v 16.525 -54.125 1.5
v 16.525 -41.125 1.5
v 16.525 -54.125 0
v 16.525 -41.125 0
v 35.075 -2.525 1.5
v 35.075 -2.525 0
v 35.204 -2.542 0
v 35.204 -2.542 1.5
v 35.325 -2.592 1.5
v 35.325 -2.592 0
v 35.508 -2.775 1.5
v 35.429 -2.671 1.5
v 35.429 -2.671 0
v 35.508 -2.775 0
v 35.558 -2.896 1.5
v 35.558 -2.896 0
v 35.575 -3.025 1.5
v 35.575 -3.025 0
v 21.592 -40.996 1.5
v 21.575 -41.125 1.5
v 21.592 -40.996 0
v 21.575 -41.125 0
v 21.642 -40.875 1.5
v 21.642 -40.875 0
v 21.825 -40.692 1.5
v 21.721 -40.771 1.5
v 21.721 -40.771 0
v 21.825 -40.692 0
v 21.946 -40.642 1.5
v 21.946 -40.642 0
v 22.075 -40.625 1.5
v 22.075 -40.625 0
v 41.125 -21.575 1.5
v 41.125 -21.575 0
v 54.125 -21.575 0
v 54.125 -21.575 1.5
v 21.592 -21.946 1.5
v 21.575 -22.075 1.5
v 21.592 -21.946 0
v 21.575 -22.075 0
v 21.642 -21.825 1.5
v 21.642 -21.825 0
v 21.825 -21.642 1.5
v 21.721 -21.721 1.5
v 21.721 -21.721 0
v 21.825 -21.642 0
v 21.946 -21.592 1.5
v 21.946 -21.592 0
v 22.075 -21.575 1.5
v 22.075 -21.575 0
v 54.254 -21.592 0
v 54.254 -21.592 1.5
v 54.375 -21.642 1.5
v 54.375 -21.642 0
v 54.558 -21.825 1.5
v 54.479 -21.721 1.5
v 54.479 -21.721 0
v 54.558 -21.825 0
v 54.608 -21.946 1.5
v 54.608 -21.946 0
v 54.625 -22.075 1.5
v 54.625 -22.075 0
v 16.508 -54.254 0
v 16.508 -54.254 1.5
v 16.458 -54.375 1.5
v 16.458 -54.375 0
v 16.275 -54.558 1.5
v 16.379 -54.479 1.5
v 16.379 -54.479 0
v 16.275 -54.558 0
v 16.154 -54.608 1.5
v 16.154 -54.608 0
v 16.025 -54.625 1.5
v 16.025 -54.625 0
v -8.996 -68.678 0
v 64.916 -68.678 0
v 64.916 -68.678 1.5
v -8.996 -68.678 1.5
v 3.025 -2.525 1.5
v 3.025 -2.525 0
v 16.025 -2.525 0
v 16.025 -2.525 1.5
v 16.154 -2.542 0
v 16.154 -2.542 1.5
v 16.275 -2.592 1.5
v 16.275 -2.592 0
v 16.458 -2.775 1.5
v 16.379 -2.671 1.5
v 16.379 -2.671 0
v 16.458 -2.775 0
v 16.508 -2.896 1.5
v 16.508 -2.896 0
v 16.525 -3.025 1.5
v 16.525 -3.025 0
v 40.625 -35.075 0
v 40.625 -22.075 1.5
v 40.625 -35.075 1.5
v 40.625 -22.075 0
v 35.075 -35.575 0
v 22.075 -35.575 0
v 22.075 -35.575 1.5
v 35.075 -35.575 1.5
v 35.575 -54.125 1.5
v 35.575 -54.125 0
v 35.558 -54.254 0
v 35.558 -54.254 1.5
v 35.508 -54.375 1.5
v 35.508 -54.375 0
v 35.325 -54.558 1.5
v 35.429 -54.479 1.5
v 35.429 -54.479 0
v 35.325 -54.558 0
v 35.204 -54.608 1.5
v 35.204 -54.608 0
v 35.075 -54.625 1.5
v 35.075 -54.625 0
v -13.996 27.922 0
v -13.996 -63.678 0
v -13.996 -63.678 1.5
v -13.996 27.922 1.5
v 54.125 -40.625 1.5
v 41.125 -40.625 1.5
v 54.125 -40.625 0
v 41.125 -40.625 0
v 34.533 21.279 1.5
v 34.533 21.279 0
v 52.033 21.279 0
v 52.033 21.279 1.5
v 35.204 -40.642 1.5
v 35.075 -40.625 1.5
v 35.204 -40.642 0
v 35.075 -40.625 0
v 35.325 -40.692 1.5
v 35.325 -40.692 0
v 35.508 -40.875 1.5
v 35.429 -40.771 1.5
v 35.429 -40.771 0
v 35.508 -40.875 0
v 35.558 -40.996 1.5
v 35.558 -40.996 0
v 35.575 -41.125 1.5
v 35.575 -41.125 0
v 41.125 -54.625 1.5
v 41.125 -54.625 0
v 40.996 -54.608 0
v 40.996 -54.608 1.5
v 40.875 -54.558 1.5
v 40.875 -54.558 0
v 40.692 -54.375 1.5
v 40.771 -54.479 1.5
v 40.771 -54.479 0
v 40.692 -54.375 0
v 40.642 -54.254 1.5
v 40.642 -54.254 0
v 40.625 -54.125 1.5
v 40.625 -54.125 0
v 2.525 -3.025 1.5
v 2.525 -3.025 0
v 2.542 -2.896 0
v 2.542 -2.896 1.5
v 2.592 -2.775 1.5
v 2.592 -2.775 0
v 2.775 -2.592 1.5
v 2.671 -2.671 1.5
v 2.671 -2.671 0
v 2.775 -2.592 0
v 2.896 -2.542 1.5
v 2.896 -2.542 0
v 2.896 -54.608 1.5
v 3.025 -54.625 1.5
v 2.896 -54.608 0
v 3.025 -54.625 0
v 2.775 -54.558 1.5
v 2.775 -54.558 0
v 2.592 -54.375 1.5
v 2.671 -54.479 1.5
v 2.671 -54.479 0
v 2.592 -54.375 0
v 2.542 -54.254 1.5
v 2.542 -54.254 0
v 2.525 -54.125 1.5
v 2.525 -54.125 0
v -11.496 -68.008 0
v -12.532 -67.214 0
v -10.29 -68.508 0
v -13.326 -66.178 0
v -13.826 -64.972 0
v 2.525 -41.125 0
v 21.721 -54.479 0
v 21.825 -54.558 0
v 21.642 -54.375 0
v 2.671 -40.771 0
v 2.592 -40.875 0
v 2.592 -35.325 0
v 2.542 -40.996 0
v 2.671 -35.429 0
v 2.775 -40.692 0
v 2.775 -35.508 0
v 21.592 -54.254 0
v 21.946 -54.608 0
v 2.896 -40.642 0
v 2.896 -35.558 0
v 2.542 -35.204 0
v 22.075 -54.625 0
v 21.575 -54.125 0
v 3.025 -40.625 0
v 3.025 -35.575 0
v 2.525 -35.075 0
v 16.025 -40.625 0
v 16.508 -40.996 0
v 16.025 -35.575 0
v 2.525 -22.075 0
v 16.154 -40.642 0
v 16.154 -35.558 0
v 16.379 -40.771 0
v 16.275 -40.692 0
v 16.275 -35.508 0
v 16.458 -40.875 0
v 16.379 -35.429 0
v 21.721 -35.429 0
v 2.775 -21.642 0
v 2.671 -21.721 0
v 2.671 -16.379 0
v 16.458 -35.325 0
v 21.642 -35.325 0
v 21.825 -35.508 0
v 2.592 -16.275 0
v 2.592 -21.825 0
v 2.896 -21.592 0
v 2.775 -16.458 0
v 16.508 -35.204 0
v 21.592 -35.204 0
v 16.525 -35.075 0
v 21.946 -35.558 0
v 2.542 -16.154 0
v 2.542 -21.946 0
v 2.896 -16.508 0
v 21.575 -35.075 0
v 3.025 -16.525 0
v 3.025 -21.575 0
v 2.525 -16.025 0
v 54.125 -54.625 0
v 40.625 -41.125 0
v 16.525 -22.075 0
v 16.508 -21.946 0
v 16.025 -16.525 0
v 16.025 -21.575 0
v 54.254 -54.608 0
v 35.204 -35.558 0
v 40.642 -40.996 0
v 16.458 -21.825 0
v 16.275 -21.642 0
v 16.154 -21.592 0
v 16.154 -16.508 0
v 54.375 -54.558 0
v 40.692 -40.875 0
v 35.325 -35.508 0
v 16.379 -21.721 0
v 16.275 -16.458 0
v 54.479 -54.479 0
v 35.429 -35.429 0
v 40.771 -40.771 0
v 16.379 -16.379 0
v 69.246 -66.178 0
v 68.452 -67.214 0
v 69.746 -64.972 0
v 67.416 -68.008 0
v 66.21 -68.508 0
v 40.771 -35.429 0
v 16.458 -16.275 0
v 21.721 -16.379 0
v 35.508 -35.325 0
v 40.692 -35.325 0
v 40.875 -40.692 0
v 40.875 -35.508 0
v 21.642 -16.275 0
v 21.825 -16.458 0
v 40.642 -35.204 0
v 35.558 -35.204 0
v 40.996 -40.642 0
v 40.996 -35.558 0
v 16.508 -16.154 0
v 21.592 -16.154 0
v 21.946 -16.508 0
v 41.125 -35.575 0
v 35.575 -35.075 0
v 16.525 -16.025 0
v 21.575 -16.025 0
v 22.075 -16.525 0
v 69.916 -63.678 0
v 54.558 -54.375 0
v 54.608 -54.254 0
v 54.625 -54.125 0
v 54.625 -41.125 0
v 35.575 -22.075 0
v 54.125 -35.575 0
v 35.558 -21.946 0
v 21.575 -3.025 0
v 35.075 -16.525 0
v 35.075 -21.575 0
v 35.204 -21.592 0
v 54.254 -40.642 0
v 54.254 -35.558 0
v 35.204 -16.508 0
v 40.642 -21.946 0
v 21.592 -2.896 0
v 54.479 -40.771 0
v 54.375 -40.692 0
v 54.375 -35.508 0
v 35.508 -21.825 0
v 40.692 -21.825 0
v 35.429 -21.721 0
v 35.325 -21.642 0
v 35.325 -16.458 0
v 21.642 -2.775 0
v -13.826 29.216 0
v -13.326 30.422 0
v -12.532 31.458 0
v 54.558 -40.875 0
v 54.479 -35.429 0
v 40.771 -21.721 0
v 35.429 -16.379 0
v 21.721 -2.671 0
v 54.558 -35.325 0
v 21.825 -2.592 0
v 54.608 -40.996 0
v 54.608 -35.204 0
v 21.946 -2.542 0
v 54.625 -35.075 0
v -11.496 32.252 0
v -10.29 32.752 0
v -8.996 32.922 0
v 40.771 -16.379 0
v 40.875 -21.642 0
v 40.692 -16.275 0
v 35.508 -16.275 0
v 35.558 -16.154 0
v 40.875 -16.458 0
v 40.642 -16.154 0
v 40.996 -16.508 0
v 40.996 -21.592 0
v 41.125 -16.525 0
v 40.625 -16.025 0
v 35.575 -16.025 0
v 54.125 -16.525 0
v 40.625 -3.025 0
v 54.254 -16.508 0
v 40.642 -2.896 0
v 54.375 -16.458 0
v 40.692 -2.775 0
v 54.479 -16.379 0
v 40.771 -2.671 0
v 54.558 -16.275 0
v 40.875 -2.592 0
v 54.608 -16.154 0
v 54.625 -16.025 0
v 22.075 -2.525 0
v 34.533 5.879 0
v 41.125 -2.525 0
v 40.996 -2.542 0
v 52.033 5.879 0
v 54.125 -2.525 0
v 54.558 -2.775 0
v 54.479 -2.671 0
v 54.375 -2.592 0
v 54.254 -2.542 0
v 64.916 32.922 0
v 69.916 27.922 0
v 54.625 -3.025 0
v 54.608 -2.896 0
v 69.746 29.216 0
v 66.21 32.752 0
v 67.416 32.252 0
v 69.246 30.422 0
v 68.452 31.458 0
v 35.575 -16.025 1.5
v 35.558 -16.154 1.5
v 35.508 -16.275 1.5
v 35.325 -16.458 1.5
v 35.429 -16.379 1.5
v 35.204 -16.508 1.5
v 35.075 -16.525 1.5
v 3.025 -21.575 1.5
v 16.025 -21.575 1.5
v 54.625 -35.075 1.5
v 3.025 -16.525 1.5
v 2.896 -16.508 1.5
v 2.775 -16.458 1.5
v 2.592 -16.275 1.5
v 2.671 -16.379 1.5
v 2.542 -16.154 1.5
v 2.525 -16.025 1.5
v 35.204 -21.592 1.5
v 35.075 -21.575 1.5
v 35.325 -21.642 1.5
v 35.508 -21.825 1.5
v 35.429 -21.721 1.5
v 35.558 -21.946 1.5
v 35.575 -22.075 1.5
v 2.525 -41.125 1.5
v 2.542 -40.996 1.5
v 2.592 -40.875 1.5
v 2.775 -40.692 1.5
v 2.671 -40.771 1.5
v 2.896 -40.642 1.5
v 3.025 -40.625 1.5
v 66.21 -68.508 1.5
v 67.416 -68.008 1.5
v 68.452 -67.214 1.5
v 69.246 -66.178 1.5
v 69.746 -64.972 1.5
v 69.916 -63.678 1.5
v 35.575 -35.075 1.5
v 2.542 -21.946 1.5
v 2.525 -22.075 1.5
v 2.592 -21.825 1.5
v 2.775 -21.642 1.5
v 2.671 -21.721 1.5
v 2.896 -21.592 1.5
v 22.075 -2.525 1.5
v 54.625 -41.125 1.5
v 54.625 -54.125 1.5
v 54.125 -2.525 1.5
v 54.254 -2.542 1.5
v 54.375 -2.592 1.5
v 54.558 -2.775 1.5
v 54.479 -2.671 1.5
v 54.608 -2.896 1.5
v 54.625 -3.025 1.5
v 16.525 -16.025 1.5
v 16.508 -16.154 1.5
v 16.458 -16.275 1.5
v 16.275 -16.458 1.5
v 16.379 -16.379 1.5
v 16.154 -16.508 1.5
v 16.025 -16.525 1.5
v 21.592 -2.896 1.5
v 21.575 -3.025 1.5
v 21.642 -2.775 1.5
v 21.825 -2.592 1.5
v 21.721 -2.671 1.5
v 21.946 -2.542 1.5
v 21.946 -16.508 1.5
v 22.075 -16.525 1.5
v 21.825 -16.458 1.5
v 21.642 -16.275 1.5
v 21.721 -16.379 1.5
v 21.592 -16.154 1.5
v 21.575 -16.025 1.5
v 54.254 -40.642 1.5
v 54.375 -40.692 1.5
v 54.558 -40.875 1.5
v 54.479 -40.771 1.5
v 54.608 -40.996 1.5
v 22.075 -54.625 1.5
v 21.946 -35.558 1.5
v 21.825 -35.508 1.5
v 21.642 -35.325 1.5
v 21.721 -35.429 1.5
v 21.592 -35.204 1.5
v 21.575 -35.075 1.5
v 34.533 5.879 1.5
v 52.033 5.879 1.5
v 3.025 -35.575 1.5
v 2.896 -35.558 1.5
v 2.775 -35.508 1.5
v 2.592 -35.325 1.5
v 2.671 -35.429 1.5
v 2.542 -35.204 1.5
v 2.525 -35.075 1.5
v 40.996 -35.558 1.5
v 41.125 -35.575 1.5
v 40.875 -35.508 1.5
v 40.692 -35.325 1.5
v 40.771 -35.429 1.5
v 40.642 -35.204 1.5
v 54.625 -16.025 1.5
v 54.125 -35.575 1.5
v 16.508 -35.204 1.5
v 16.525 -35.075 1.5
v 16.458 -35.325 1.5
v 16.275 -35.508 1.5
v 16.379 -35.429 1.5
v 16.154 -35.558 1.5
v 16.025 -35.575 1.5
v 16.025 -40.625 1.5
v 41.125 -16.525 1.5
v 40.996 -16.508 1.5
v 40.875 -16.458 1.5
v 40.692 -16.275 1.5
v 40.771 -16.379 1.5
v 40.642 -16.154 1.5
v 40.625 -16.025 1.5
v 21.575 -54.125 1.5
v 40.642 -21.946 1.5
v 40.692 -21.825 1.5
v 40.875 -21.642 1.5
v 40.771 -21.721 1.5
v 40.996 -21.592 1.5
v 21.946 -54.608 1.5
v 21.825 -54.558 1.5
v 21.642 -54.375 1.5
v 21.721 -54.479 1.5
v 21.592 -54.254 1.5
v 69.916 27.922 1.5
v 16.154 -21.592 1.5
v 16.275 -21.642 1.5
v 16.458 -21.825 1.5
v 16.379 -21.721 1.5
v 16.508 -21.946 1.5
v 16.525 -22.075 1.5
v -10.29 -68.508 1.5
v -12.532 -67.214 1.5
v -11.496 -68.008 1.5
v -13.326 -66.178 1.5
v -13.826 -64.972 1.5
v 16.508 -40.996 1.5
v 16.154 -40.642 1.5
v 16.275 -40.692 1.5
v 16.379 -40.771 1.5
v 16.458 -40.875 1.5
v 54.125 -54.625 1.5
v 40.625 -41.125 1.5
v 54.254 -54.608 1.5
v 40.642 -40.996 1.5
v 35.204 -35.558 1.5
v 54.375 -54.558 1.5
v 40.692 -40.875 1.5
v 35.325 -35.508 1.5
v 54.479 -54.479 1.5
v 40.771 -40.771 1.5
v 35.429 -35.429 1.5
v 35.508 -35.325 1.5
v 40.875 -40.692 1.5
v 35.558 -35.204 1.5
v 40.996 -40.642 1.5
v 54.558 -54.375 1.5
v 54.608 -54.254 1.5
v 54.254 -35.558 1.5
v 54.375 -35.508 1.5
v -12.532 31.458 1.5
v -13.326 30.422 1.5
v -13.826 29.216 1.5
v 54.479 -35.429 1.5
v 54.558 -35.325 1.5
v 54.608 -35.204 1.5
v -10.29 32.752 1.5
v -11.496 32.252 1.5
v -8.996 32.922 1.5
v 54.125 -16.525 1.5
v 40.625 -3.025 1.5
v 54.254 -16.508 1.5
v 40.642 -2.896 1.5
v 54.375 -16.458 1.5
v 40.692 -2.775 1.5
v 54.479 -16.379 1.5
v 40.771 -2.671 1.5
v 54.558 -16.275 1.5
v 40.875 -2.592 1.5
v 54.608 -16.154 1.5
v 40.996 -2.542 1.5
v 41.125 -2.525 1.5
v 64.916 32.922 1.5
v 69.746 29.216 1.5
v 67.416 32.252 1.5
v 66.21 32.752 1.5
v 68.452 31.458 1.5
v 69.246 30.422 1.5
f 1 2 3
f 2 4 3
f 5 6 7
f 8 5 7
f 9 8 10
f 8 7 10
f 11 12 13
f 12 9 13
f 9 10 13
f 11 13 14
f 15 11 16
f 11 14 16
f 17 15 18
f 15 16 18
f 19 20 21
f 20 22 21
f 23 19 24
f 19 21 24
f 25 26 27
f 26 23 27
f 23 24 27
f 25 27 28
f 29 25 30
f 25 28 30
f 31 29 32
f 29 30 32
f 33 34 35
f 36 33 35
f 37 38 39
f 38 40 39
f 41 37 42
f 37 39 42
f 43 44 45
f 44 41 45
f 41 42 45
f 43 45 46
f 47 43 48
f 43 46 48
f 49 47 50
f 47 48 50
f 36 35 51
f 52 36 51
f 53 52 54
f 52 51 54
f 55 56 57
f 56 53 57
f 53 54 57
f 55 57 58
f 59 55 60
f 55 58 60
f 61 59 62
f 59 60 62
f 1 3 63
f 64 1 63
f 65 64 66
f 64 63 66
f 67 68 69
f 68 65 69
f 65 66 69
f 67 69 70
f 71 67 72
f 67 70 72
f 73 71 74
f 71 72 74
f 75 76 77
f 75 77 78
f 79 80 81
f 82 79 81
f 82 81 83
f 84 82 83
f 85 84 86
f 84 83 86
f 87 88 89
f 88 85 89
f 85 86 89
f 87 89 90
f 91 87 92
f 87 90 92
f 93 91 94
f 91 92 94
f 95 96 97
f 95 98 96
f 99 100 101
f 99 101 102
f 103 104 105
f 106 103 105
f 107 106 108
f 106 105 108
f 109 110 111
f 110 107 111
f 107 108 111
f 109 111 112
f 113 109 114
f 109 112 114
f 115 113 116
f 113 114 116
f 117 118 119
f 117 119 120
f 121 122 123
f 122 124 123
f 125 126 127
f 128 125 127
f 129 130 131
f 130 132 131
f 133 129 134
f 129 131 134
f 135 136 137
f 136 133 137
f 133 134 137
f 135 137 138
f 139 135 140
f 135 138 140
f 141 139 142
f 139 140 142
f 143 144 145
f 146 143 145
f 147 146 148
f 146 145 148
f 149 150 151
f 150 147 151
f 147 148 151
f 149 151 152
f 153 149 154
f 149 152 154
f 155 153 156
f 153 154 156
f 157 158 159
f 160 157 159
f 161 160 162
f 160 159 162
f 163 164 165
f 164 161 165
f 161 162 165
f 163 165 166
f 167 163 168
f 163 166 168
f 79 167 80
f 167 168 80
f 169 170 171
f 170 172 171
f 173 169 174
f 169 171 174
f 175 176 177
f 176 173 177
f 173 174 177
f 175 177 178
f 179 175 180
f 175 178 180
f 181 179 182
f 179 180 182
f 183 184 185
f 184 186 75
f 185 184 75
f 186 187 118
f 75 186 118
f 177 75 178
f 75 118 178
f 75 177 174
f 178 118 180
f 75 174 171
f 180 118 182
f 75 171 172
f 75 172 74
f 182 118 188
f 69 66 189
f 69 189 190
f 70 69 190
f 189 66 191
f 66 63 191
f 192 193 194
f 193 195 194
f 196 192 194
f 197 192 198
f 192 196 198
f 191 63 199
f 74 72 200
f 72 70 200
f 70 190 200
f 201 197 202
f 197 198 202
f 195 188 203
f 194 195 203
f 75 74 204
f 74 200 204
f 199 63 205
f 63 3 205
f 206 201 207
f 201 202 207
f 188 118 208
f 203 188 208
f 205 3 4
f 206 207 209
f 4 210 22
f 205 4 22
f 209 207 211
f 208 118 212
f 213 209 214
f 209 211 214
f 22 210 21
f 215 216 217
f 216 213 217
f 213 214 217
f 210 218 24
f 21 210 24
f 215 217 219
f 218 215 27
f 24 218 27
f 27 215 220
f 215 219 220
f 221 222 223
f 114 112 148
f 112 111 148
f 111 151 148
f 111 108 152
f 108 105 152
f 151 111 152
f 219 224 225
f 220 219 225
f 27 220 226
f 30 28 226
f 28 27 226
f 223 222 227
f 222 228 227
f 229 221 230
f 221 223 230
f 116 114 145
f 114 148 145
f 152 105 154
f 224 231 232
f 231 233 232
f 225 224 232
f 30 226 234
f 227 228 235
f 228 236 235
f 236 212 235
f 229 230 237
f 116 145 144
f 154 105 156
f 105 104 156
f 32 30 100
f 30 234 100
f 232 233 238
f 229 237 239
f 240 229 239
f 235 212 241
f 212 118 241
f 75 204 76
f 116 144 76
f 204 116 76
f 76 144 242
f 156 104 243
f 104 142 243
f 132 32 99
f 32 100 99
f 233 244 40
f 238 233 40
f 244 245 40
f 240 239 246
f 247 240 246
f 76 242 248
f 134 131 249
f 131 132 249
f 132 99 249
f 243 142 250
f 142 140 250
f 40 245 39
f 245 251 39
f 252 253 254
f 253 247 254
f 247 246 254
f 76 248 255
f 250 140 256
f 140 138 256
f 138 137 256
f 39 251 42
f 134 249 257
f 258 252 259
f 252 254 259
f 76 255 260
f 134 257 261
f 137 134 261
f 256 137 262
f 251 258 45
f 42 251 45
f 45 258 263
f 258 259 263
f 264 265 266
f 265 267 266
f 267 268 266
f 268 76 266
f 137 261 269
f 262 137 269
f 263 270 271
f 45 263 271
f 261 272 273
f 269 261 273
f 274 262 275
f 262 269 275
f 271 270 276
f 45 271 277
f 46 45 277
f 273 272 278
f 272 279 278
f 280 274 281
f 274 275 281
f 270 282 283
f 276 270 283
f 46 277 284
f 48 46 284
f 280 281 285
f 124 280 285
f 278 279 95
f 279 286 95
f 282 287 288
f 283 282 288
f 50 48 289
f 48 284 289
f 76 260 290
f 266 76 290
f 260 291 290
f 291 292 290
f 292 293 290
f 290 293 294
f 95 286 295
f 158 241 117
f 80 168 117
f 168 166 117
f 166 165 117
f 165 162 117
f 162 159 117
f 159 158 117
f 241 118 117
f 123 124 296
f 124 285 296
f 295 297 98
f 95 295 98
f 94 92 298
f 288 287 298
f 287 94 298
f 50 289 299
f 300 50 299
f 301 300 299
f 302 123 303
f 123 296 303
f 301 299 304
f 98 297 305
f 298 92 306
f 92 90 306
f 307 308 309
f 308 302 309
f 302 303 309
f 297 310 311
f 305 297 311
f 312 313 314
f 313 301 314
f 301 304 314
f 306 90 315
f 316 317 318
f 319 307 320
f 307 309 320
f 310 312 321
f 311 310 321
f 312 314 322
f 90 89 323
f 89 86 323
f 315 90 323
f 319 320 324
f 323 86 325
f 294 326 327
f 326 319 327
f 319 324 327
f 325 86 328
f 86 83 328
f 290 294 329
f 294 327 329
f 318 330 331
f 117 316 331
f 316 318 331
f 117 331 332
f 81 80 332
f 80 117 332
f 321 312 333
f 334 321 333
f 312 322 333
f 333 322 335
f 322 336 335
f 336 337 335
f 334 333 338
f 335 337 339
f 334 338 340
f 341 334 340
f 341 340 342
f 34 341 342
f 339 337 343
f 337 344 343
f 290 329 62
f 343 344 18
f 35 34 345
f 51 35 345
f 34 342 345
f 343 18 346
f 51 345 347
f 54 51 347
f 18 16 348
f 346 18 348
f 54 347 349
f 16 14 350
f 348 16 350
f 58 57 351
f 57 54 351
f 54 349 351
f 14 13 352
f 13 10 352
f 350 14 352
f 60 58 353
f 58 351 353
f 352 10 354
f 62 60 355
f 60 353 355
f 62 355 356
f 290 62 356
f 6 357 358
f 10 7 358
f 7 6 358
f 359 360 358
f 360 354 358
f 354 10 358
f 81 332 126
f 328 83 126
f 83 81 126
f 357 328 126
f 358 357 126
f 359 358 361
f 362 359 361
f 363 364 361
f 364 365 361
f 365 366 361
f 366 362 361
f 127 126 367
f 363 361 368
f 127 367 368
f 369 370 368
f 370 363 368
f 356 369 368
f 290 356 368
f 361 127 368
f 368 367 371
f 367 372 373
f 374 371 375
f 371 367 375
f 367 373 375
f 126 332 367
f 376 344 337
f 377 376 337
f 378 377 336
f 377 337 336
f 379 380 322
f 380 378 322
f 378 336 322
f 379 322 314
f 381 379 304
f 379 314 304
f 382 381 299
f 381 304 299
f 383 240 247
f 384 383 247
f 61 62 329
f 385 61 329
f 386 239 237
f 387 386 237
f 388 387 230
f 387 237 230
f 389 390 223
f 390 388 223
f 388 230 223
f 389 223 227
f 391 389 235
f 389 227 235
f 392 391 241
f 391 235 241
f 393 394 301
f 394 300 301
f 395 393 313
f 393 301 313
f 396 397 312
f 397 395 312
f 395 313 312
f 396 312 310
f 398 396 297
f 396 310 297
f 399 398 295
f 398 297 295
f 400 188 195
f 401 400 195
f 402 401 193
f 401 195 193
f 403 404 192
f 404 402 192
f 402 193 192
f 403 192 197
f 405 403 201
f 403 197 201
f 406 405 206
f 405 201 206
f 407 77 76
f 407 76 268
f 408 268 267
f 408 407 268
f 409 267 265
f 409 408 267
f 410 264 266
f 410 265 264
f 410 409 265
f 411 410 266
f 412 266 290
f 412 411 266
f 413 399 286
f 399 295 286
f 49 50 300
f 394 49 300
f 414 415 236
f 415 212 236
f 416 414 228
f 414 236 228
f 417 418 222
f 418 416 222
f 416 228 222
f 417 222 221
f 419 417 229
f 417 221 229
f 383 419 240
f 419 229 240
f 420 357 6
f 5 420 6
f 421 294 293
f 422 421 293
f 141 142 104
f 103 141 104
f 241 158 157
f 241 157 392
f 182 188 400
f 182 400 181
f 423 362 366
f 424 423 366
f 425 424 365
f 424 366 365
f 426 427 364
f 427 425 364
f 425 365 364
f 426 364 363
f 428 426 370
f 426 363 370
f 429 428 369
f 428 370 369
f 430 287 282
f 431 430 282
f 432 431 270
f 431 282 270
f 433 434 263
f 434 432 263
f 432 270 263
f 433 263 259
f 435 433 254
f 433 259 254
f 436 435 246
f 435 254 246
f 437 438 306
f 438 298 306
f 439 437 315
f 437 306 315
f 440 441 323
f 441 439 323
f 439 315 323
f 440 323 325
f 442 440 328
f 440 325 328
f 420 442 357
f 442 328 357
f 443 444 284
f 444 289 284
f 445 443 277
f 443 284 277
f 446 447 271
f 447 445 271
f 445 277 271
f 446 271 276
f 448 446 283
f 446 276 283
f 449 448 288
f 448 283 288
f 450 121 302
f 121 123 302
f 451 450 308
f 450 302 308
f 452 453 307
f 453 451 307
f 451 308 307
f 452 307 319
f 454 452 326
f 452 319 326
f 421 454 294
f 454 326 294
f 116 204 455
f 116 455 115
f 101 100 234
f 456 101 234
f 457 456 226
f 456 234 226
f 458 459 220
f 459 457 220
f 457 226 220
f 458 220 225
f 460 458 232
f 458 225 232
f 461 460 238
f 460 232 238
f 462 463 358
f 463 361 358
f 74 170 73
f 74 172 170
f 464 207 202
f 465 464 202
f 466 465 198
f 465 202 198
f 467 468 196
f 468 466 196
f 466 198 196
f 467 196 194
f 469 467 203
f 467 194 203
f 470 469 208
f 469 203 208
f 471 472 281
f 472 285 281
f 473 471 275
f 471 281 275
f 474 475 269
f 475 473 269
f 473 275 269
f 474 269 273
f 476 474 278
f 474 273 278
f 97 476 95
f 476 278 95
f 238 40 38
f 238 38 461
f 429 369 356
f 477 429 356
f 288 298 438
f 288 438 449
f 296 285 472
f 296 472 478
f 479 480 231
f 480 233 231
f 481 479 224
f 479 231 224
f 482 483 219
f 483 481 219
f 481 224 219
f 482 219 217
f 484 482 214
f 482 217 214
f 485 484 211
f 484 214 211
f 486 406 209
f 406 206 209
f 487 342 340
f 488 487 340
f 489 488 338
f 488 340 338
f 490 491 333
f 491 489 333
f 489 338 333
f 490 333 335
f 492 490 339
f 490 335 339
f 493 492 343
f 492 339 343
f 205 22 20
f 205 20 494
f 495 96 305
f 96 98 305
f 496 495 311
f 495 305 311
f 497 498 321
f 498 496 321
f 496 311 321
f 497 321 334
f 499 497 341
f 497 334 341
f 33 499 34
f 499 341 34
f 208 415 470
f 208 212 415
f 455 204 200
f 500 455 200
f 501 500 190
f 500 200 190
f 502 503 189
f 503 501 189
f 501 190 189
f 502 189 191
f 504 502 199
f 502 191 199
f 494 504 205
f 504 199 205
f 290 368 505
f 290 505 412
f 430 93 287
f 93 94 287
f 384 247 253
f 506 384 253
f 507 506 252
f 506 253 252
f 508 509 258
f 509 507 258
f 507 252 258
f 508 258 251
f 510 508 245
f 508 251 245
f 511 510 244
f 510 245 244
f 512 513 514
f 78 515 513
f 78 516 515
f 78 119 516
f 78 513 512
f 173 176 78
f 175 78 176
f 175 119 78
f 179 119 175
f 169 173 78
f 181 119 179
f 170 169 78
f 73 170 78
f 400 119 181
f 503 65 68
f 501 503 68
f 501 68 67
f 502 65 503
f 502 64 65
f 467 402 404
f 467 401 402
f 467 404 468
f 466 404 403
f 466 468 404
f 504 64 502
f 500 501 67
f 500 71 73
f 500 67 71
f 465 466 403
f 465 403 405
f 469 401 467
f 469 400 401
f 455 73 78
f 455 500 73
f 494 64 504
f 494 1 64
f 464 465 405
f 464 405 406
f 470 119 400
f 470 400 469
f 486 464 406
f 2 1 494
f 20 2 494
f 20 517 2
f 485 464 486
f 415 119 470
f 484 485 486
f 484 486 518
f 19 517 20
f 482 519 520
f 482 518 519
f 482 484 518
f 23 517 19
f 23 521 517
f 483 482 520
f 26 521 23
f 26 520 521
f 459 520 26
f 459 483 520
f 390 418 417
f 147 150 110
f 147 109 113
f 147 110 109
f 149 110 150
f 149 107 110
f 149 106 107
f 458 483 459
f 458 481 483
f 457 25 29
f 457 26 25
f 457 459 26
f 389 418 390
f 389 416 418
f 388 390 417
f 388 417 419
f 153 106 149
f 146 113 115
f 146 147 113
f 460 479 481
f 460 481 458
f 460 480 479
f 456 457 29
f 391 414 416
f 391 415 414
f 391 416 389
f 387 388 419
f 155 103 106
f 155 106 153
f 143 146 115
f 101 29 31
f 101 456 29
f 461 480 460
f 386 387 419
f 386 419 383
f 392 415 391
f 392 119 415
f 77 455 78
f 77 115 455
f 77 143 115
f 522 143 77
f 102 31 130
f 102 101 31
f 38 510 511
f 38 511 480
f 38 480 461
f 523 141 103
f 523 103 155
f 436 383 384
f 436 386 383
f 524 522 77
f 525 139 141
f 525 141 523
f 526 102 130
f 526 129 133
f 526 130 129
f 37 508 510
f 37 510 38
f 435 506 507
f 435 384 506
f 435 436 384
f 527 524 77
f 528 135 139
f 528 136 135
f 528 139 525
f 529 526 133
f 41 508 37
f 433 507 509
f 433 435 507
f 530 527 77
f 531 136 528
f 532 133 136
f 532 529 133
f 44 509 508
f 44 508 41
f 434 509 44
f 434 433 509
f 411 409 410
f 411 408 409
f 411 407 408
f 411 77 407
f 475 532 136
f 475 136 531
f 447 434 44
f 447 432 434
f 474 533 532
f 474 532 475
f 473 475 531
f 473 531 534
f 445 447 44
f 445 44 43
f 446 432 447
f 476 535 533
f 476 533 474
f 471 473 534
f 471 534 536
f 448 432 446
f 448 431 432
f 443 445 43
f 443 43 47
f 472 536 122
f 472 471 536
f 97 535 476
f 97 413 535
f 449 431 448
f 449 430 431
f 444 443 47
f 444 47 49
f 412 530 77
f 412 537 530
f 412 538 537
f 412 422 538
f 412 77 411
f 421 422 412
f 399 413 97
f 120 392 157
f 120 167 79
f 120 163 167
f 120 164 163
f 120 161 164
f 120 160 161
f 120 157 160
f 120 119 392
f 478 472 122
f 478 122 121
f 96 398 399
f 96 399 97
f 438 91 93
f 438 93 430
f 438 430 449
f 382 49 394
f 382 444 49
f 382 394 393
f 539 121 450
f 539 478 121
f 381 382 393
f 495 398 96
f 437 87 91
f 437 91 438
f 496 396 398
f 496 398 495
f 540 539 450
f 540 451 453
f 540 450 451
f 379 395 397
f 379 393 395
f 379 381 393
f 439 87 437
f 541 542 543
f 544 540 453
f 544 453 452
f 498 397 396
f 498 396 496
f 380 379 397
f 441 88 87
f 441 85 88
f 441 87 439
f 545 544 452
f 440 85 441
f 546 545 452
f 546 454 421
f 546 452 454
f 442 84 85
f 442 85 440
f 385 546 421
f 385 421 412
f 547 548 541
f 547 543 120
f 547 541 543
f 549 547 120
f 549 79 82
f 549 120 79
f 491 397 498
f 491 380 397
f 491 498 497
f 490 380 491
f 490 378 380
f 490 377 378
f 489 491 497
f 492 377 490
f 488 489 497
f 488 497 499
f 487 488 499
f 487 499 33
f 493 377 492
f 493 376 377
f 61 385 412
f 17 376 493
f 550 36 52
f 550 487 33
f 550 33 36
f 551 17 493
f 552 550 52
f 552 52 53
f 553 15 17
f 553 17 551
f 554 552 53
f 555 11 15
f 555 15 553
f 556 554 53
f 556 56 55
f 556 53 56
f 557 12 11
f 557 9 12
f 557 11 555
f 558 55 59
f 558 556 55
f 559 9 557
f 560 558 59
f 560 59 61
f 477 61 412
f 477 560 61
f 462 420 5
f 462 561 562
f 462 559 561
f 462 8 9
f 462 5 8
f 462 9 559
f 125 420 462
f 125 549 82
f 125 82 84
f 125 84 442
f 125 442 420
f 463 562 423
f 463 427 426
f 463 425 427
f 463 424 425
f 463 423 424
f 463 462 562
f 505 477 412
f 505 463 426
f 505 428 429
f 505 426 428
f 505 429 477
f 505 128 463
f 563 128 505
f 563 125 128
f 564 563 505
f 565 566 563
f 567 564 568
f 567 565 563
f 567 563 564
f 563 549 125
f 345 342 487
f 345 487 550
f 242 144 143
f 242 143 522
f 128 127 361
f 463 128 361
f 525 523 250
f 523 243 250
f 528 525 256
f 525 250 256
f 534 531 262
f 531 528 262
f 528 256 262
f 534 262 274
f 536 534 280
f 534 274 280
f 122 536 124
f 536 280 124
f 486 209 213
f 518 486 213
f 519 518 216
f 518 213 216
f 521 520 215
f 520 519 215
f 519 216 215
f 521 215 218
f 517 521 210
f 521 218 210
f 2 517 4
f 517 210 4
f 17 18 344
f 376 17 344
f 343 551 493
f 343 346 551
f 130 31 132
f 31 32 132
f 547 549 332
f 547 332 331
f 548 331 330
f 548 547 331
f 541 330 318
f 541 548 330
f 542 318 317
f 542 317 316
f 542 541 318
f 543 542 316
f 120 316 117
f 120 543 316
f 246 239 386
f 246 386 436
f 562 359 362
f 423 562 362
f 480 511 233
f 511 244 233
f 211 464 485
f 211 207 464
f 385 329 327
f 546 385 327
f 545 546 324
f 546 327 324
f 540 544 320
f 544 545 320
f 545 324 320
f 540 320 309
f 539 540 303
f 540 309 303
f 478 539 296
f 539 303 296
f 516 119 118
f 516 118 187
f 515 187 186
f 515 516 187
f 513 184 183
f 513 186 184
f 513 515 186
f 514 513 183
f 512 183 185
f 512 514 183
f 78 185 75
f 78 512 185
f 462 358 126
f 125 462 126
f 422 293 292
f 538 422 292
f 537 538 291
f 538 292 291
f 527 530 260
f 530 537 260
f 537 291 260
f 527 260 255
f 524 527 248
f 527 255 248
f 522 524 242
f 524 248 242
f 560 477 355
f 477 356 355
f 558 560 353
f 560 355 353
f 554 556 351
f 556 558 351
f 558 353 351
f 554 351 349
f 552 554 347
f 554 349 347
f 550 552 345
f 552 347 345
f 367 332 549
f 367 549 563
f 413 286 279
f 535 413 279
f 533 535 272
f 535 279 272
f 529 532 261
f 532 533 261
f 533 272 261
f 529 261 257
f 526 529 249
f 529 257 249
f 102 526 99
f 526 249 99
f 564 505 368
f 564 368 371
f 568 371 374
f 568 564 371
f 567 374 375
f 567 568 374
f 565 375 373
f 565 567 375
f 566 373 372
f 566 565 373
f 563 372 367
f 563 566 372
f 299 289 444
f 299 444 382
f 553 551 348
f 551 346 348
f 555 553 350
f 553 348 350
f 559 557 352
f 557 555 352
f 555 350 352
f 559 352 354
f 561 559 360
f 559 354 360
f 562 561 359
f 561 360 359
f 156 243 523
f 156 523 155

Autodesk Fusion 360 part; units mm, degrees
sketch "Szkic1" plane through (0, 0, 0) normal (0, 0, 1) x (1, 0, 0)
  line L0 (-13.996, 32.922) -> (69.916, 32.922)
  line L1 (69.916, 32.922) -> (69.916, -68.678)
  line L2 (69.916, -68.678) -> (-13.996, -68.678)
  line L3 (-13.996, -68.678) -> (-13.996, 32.922)
  line L4 (3.025, -2.525) -> (16.025, -2.525)
  line L5 (3.025, -16.525) -> (16.025, -16.525)
  line L6 (2.525, -3.025) -> (2.525, -16.025)
  line L7 (16.525, -3.025) -> (16.525, -16.025)
  arc A0 (3.025, -2.525) -> (2.525, -3.025) centre (3.025, -3.025) ccw
  arc A1 (16.525, -3.025) -> (16.025, -2.525) centre (16.025, -3.025) ccw
  arc A2 (2.525, -16.025) -> (3.025, -16.525) centre (3.025, -16.025) ccw
  arc A3 (16.025, -16.525) -> (16.525, -16.025) centre (16.025, -16.025) ccw
  line L8 (22.075, -2.525) -> (35.075, -2.525)
  line L9 (22.075, -16.525) -> (35.075, -16.525)
  line L10 (21.575, -3.025) -> (21.575, -16.025)
  line L11 (35.575, -3.025) -> (35.575, -16.025)
  arc A4 (22.075, -2.525) -> (21.575, -3.025) centre (22.075, -3.025) ccw
  arc A5 (35.575, -3.025) -> (35.075, -2.525) centre (35.075, -3.025) ccw
  arc A6 (21.575, -16.025) -> (22.075, -16.525) centre (22.075, -16.025) ccw
  arc A7 (35.075, -16.525) -> (35.575, -16.025) centre (35.075, -16.025) ccw
  line L12 (41.125, -2.525) -> (54.125, -2.525)
  line L13 (41.125, -16.525) -> (54.125, -16.525)
  line L14 (40.625, -3.025) -> (40.625, -16.025)
  line L15 (54.625, -3.025) -> (54.625, -16.025)
  arc A8 (41.125, -2.525) -> (40.625, -3.025) centre (41.125, -3.025) ccw
  arc A9 (54.625, -3.025) -> (54.125, -2.525) centre (54.125, -3.025) ccw
  arc A10 (40.625, -16.025) -> (41.125, -16.525) centre (41.125, -16.025) ccw
  arc A11 (54.125, -16.525) -> (54.625, -16.025) centre (54.125, -16.025) ccw
  line L16 (3.025, -21.575) -> (16.025, -21.575)
  line L17 (3.025, -35.575) -> (16.025, -35.575)
  line L18 (2.525, -22.075) -> (2.525, -35.075)
  line L19 (16.525, -22.075) -> (16.525, -35.075)
  arc A12 (3.025, -21.575) -> (2.525, -22.075) centre (3.025, -22.075) ccw
  arc A13 (16.525, -22.075) -> (16.025, -21.575) centre (16.025, -22.075) ccw
  arc A14 (2.525, -35.075) -> (3.025, -35.575) centre (3.025, -35.075) ccw
  arc A15 (16.025, -35.575) -> (16.525, -35.075) centre (16.025, -35.075) ccw
  line L20 (22.075, -21.575) -> (35.075, -21.575)
  line L21 (22.075, -35.575) -> (35.075, -35.575)
  line L22 (21.575, -22.075) -> (21.575, -35.075)
  line L23 (35.575, -22.075) -> (35.575, -35.075)
  arc A16 (22.075, -21.575) -> (21.575, -22.075) centre (22.075, -22.075) ccw
  arc A17 (35.575, -22.075) -> (35.075, -21.575) centre (35.075, -22.075) ccw
  arc A18 (21.575, -35.075) -> (22.075, -35.575) centre (22.075, -35.075) ccw
  arc A19 (35.075, -35.575) -> (35.575, -35.075) centre (35.075, -35.075) ccw
  line L24 (41.125, -21.575) -> (54.125, -21.575)
  line L25 (41.125, -35.575) -> (54.125, -35.575)
  line L26 (40.625, -22.075) -> (40.625, -35.075)
  line L27 (54.625, -22.075) -> (54.625, -35.075)
  arc A20 (41.125, -21.575) -> (40.625, -22.075) centre (41.125, -22.075) ccw
  arc A21 (54.625, -22.075) -> (54.125, -21.575) centre (54.125, -22.075) ccw
  arc A22 (40.625, -35.075) -> (41.125, -35.575) centre (41.125, -35.075) ccw
  arc A23 (54.125, -35.575) -> (54.625, -35.075) centre (54.125, -35.075) ccw
  line L28 (3.025, -40.625) -> (16.025, -40.625)
  line L29 (3.025, -54.625) -> (16.025, -54.625)
  line L30 (2.525, -41.125) -> (2.525, -54.125)
  line L31 (16.525, -41.125) -> (16.525, -54.125)
  arc A24 (3.025, -40.625) -> (2.525, -41.125) centre (3.025, -41.125) ccw
  arc A25 (16.525, -41.125) -> (16.025, -40.625) centre (16.025, -41.125) ccw
  arc A26 (2.525, -54.125) -> (3.025, -54.625) centre (3.025, -54.125) ccw
  arc A27 (16.025, -54.625) -> (16.525, -54.125) centre (16.025, -54.125) ccw
  line L32 (22.075, -40.625) -> (35.075, -40.625)
  line L33 (22.075, -54.625) -> (35.075, -54.625)
  line L34 (21.575, -41.125) -> (21.575, -54.125)
  line L35 (35.575, -41.125) -> (35.575, -54.125)
  arc A28 (22.075, -40.625) -> (21.575, -41.125) centre (22.075, -41.125) ccw
  arc A29 (35.575, -41.125) -> (35.075, -40.625) centre (35.075, -41.125) ccw
  arc A30 (21.575, -54.125) -> (22.075, -54.625) centre (22.075, -54.125) ccw
  arc A31 (35.075, -54.625) -> (35.575, -54.125) centre (35.075, -54.125) ccw
  line L36 (41.125, -40.625) -> (54.125, -40.625)
  line L37 (41.125, -54.625) -> (54.125, -54.625)
  line L38 (40.625, -41.125) -> (40.625, -54.125)
  line L39 (54.625, -41.125) -> (54.625, -54.125)
  arc A32 (41.125, -40.625) -> (40.625, -41.125) centre (41.125, -41.125) ccw
  arc A33 (54.625, -41.125) -> (54.125, -40.625) centre (54.125, -41.125) ccw
  arc A34 (40.625, -54.125) -> (41.125, -54.625) centre (41.125, -54.125) ccw
  arc A35 (54.125, -54.625) -> (54.625, -54.125) centre (54.125, -54.125) ccw
  line L40 (34.533, 21.279) -> (52.033, 21.279)
  line L41 (52.033, 21.279) -> (52.033, 5.879)
  line L42 (52.033, 5.879) -> (34.533, 5.879)
  line L43 (34.533, 5.879) -> (34.533, 21.279)
  dimension "d1" = 16.521
  dimension "d2" = 14.053
  dimension "d3" = 83.912
  dimension "d4" = 101.6
  dimension "d5" = 17.5
  dimension "d6" = 15.4
  dimension "d7" = 8.404
  dimension "d8" = 17.883
extrude "Wyciągnięcie proste1" add sketch "Szkic1" along normal blind 1.5
fillet "Zaokrąglenie1" radius 5 4 edges at (69.916, -68.678, 0.75) (-13.996, -68.678, 0.75) (-13.996, 32.922, 0.75) (69.916, 32.922, 0.75)
